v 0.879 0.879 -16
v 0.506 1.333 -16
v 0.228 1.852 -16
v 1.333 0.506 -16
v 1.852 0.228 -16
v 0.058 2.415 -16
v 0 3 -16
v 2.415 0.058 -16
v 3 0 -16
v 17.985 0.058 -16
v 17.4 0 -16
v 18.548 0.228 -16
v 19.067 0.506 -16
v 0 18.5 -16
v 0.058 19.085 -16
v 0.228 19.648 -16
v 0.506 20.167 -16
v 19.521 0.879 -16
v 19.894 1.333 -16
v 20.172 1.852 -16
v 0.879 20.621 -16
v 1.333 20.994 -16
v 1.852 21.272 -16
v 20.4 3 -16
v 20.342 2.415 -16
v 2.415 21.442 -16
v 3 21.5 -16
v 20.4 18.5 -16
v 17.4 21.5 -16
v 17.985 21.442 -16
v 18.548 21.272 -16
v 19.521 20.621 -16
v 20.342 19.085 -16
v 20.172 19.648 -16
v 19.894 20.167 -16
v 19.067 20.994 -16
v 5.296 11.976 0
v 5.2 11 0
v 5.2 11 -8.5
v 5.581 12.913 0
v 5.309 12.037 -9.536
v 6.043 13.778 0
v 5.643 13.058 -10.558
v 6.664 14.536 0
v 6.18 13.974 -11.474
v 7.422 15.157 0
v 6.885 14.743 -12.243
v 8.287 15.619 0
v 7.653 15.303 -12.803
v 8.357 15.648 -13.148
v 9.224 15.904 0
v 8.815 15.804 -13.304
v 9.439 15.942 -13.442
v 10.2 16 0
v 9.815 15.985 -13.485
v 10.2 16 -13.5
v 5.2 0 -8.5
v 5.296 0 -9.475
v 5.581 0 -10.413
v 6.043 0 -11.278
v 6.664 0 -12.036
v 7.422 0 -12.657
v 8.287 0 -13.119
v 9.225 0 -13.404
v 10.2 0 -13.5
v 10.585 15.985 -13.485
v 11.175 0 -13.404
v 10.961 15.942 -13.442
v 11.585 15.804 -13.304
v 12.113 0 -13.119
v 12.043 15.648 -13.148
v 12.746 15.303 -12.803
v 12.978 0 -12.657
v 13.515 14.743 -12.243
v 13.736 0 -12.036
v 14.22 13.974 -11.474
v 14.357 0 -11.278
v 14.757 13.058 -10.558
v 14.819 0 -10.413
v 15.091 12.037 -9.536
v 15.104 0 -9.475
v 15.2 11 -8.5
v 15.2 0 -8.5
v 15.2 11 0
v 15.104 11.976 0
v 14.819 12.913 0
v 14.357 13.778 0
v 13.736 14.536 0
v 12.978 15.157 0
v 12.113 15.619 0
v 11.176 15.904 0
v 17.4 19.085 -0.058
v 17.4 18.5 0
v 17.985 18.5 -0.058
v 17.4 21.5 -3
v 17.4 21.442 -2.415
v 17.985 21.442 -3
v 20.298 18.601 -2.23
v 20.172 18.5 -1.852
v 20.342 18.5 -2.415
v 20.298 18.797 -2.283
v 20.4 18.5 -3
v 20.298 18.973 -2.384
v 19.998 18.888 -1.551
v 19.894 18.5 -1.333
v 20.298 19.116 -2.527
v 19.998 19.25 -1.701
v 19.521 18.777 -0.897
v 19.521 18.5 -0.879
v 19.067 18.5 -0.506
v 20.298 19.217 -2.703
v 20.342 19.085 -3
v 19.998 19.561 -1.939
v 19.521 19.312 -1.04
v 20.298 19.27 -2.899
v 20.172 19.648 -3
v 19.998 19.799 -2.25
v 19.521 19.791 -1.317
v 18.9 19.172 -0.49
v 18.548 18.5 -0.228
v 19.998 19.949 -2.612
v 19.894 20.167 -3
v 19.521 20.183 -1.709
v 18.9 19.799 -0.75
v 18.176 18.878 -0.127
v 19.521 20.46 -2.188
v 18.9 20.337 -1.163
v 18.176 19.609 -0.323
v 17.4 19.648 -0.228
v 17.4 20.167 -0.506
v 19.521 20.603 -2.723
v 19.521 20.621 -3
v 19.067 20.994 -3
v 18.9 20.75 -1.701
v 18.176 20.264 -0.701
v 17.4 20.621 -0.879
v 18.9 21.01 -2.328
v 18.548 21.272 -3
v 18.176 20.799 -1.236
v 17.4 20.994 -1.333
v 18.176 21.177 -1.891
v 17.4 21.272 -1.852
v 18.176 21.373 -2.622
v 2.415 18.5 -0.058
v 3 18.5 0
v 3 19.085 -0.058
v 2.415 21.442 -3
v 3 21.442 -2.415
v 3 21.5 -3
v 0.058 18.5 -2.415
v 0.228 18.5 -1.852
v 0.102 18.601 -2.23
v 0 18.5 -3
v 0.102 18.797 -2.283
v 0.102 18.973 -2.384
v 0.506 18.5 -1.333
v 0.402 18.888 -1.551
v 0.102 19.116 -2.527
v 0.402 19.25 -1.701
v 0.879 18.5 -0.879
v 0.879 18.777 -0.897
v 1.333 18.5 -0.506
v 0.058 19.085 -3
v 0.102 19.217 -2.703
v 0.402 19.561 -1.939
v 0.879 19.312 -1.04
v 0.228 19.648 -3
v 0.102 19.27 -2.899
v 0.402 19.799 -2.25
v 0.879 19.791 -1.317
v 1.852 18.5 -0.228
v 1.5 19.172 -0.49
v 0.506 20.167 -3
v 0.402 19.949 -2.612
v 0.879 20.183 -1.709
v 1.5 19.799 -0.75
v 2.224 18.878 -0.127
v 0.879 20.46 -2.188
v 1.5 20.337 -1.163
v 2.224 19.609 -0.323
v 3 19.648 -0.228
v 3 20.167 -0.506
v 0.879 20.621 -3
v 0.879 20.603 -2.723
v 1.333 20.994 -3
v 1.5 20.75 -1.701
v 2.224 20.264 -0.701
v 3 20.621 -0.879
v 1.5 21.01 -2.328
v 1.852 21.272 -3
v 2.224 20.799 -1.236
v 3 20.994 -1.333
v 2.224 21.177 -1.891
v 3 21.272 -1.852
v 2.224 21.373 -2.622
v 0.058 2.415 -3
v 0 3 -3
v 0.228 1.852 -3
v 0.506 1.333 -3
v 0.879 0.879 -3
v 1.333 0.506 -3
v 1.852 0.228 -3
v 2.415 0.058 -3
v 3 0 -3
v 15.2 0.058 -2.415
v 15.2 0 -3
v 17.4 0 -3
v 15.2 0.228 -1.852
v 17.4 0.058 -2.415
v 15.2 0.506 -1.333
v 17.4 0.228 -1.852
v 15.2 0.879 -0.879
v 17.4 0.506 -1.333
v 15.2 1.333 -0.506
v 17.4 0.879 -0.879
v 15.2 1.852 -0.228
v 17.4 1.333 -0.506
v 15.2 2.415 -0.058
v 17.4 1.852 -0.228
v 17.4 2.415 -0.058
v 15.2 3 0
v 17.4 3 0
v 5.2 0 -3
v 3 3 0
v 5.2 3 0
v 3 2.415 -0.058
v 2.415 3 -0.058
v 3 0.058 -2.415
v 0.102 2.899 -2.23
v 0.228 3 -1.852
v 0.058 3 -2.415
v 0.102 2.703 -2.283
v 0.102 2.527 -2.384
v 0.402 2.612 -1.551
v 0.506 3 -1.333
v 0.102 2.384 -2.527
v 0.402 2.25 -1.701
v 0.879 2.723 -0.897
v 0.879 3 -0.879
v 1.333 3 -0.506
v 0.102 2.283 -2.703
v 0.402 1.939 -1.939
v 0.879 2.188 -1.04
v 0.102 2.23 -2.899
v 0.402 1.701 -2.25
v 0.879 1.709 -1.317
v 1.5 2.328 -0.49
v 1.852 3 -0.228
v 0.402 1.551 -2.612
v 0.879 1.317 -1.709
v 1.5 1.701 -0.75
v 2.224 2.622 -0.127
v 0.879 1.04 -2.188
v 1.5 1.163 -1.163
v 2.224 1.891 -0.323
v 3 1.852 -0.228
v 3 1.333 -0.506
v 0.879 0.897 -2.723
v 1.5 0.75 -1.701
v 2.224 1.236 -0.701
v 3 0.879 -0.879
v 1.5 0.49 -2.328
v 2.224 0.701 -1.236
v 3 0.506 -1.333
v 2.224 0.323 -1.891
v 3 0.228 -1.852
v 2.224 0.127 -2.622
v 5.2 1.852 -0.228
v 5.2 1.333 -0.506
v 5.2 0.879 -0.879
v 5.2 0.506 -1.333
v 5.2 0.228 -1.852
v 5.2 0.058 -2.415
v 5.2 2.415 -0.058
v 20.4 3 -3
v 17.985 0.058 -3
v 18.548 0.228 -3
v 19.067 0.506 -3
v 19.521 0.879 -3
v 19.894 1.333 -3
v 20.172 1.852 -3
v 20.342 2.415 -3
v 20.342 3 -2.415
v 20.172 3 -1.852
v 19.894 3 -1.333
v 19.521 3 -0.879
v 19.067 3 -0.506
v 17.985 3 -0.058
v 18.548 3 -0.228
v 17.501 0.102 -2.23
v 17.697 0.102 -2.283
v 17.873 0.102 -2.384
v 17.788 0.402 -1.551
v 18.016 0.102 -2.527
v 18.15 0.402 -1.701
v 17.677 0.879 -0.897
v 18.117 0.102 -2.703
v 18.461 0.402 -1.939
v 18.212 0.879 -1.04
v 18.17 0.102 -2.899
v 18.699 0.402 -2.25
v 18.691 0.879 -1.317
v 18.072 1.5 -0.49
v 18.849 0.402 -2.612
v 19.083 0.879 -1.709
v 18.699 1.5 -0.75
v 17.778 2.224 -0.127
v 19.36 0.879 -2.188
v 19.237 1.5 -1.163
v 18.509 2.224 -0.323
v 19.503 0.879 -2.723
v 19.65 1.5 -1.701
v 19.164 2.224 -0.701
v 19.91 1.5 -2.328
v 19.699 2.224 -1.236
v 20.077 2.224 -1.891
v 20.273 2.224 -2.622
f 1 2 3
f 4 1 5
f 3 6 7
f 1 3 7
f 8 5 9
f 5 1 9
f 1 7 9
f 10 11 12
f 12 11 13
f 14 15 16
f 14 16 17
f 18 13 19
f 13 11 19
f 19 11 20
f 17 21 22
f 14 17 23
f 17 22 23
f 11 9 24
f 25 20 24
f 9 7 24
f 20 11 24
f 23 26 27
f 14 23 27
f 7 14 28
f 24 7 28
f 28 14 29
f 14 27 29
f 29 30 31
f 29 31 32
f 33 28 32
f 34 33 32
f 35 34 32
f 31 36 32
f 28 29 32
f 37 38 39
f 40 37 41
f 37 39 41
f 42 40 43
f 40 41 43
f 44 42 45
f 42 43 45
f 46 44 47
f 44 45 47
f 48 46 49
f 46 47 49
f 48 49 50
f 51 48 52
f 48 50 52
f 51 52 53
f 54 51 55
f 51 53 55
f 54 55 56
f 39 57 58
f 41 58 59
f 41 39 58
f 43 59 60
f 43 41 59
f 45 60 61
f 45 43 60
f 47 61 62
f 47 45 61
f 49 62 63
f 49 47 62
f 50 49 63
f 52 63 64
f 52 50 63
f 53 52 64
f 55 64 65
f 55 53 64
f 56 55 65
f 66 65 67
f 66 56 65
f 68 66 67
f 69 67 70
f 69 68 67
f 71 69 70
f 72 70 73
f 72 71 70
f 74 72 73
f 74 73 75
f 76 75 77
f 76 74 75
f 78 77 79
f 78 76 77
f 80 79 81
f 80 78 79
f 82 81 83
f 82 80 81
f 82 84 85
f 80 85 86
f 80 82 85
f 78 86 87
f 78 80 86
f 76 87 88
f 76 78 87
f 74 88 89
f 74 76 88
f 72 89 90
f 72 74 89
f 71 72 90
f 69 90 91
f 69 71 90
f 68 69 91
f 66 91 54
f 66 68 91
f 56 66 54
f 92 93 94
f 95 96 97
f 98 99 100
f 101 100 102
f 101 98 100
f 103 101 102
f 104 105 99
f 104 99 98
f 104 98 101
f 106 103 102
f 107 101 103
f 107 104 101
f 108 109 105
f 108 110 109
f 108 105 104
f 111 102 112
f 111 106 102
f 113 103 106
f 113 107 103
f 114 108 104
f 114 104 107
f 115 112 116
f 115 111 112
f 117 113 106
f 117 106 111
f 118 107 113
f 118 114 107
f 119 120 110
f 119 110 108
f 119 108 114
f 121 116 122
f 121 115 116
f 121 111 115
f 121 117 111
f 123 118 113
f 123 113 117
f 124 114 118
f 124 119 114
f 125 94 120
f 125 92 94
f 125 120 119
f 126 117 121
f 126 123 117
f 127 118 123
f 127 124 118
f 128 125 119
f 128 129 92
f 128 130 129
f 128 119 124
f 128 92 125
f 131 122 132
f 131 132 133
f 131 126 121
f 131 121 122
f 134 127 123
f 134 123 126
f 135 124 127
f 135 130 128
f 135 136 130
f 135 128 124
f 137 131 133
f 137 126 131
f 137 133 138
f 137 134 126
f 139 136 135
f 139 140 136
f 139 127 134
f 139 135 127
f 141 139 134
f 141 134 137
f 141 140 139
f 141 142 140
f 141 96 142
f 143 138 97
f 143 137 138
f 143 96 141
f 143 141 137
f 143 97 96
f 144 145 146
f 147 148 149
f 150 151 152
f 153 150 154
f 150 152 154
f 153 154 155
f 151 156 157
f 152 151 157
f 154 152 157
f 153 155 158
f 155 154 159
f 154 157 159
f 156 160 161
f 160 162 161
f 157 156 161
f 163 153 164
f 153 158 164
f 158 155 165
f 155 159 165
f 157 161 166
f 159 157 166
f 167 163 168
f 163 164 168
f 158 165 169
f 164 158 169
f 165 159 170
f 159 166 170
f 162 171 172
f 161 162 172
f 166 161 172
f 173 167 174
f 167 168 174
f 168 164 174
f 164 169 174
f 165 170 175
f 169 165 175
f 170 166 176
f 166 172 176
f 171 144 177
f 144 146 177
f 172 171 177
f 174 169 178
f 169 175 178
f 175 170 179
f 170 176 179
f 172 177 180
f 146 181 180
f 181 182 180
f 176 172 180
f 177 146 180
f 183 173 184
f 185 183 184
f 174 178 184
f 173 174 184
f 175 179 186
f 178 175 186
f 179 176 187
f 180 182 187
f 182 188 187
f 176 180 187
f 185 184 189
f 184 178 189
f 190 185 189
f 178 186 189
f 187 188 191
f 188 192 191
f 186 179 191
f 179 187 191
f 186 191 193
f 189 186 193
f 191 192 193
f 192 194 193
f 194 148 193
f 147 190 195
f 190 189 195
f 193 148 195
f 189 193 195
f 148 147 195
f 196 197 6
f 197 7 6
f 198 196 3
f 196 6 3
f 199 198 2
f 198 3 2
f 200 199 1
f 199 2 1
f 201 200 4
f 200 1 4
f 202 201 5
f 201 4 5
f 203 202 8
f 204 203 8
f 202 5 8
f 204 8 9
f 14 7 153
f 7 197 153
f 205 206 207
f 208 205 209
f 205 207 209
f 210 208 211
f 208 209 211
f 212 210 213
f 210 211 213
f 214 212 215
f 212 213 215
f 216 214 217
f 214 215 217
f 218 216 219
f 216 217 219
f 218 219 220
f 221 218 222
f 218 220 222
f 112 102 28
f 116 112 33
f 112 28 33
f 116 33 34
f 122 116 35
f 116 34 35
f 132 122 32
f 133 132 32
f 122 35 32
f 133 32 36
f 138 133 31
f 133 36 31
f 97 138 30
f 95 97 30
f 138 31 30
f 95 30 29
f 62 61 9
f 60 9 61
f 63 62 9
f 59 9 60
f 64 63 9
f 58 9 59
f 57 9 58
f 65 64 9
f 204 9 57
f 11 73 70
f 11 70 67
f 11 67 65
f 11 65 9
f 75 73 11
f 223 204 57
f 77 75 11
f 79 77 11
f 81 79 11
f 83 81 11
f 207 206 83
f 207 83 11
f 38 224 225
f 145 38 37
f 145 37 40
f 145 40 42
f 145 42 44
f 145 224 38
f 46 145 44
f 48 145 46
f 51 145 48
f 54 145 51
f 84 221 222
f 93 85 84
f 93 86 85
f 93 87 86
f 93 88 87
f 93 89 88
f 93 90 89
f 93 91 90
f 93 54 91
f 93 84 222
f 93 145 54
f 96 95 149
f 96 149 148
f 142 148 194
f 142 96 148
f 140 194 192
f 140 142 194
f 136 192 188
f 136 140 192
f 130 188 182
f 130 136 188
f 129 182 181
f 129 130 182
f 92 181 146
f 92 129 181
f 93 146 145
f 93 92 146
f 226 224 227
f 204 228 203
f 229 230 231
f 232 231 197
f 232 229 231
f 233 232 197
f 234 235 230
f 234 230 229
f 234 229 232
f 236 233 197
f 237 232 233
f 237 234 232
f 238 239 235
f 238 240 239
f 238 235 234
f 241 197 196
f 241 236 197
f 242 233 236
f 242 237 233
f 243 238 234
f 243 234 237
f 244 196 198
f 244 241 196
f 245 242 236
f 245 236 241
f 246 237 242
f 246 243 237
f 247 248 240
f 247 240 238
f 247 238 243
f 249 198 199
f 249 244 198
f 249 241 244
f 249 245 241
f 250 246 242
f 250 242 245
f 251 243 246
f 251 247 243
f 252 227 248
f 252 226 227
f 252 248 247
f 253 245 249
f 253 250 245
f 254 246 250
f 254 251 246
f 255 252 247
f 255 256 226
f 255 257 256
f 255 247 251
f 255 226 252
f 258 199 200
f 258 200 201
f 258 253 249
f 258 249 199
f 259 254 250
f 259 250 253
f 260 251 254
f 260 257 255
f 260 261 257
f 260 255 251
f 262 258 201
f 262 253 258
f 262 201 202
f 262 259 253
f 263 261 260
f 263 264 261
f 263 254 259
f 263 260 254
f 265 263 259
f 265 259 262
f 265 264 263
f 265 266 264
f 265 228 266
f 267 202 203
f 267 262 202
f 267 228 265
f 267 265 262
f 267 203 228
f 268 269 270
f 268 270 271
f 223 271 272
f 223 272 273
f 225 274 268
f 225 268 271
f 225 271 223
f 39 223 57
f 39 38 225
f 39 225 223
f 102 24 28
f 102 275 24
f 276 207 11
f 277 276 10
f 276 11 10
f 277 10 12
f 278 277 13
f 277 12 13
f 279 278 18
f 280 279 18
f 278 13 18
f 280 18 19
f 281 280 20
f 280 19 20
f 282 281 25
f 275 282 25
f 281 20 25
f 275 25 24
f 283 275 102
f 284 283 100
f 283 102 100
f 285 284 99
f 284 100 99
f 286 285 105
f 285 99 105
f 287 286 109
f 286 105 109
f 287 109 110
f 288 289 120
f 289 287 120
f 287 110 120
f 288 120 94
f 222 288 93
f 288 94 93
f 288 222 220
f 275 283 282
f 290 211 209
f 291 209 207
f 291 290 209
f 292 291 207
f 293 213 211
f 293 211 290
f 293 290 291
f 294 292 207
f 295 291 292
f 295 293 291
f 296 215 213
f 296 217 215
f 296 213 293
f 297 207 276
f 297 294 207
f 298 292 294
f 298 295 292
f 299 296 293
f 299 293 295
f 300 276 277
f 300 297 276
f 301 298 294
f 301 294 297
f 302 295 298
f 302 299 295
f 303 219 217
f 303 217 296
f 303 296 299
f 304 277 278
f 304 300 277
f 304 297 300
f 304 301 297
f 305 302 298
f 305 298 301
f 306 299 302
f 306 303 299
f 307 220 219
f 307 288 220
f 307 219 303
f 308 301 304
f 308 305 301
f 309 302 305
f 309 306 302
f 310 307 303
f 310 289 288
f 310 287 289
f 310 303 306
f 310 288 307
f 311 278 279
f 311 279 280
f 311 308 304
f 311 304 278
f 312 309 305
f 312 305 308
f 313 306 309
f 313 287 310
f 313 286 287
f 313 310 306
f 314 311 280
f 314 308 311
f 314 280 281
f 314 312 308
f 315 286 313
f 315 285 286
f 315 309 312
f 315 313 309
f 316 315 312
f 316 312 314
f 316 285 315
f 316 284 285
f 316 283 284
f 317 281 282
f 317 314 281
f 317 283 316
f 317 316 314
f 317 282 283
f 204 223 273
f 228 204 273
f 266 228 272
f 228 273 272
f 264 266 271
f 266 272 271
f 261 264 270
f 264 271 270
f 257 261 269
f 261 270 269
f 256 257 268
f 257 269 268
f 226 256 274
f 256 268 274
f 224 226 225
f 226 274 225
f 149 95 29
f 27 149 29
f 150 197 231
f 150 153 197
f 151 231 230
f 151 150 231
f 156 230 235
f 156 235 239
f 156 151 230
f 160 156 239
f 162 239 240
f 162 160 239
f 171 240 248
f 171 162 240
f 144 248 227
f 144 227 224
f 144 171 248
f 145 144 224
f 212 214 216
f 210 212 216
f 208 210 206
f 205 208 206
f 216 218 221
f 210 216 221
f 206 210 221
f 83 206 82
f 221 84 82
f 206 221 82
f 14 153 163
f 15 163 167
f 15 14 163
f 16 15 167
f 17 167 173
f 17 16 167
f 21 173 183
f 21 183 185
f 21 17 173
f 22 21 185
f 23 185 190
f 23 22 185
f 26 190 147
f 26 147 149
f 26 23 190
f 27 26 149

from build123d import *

# Parameters (mm, degrees)
SKETCH1_W      = 20.4
SKETCH1_H      = 21.5
EXTRUDE1_DEPTH = 16
FILLET8_R      = 3
SKETCH2_W      = 14.5
SKETCH2_H      = 17
EXTRUDE2_DEPTH = 5
FILLET9_R      = 5
FILLET10_R     = 5


# Some blends are built 0.0001 mm under size
with BuildPart() as part:
    # Sketch1 → Extrude1 (new body)
    with BuildSketch(Plane.XY):
        with Locations((10.2, 10.75)):
            Rectangle(SKETCH1_W, SKETCH1_H)
    extrude(amount=-EXTRUDE1_DEPTH)

    # Fillet8
    fillet8_edges = [part.edges().sort_by_distance(p)[0] for p in [
        (10.2, 21.5, 0),
        (20.4, 10.75, 0),
        (10.2, 0, 0),
        (0, 10.75, 0),
        (0, 21.5, -8),
        (20.4, 21.5, -8),
        (20.4, 0, -8),
        (0, 0, -8),
    ]]
    fillet(fillet8_edges, radius=FILLET8_R)

    # Sketch2 → Extrude2 (cut, symmetric)
    with BuildSketch(Plane(origin=(10.2, 0, 0), x_dir=(0, 0, -1), z_dir=(1, 0, 0))):
        with Locations((6.25, 7.5)):
            Rectangle(SKETCH2_W, SKETCH2_H)
    extrude(amount=EXTRUDE2_DEPTH, both=True, mode=Mode.SUBTRACT)

    # Fillet9
    fillet9_edges = [part.edges().sort_by_distance(p)[0] for p in [
        (5.2, 16, -6.75),
        (15.2, 16, -6.75),
    ]]
    fillet(fillet9_edges, radius=FILLET9_R - 0.0001)  # a hair under: the kernel refuses the full size

    # Fillet10
    # the kernel refuses this fillet: 5 mm, written as the material it adds along each edge
    with BuildSketch(Plane(origin=(5.2, 23.5001, -13.5), x_dir=(0, 0, 1), z_dir=(0, -1, 0))) as fillet10_piece_1_section:
        with BuildLine():
            CenterArc((FILLET10_R, -FILLET10_R), FILLET10_R, 90, 90)
            Line((0, -FILLET10_R), (0, 0))
            Line((0, 0), (FILLET10_R, 0))
        make_face()
    fillet10_piece_1 = extrude(amount=23.5001, mode=Mode.PRIVATE)
    fillet10_piece_1 = split(fillet10_piece_1, bisect_by=Plane(origin=(6.690730553, 21.5, -12.634344102), z_dir=(0, -1, 0)), keep=Keep.TOP, mode=Mode.PRIVATE)
    add(fillet10_piece_1)
    with BuildSketch(Plane(origin=(15.2, 23.5001, -13.5), x_dir=(-1, 0, 0), z_dir=(0, -1, 0))) as fillet10_piece_2_section:
        with BuildLine():
            CenterArc((FILLET10_R, -FILLET10_R), FILLET10_R, 90, 90)
            Line((0, -FILLET10_R), (0, 0))
            Line((0, 0), (FILLET10_R, 0))
        make_face()
    fillet10_piece_2 = extrude(amount=23.5001, mode=Mode.PRIVATE)
    fillet10_piece_2 = split(fillet10_piece_2, bisect_by=Plane(origin=(13.709267183, 21.5, -12.634319822), z_dir=(0, -1, 0)), keep=Keep.TOP, mode=Mode.PRIVATE)
    add(fillet10_piece_2)


solid = part.part
